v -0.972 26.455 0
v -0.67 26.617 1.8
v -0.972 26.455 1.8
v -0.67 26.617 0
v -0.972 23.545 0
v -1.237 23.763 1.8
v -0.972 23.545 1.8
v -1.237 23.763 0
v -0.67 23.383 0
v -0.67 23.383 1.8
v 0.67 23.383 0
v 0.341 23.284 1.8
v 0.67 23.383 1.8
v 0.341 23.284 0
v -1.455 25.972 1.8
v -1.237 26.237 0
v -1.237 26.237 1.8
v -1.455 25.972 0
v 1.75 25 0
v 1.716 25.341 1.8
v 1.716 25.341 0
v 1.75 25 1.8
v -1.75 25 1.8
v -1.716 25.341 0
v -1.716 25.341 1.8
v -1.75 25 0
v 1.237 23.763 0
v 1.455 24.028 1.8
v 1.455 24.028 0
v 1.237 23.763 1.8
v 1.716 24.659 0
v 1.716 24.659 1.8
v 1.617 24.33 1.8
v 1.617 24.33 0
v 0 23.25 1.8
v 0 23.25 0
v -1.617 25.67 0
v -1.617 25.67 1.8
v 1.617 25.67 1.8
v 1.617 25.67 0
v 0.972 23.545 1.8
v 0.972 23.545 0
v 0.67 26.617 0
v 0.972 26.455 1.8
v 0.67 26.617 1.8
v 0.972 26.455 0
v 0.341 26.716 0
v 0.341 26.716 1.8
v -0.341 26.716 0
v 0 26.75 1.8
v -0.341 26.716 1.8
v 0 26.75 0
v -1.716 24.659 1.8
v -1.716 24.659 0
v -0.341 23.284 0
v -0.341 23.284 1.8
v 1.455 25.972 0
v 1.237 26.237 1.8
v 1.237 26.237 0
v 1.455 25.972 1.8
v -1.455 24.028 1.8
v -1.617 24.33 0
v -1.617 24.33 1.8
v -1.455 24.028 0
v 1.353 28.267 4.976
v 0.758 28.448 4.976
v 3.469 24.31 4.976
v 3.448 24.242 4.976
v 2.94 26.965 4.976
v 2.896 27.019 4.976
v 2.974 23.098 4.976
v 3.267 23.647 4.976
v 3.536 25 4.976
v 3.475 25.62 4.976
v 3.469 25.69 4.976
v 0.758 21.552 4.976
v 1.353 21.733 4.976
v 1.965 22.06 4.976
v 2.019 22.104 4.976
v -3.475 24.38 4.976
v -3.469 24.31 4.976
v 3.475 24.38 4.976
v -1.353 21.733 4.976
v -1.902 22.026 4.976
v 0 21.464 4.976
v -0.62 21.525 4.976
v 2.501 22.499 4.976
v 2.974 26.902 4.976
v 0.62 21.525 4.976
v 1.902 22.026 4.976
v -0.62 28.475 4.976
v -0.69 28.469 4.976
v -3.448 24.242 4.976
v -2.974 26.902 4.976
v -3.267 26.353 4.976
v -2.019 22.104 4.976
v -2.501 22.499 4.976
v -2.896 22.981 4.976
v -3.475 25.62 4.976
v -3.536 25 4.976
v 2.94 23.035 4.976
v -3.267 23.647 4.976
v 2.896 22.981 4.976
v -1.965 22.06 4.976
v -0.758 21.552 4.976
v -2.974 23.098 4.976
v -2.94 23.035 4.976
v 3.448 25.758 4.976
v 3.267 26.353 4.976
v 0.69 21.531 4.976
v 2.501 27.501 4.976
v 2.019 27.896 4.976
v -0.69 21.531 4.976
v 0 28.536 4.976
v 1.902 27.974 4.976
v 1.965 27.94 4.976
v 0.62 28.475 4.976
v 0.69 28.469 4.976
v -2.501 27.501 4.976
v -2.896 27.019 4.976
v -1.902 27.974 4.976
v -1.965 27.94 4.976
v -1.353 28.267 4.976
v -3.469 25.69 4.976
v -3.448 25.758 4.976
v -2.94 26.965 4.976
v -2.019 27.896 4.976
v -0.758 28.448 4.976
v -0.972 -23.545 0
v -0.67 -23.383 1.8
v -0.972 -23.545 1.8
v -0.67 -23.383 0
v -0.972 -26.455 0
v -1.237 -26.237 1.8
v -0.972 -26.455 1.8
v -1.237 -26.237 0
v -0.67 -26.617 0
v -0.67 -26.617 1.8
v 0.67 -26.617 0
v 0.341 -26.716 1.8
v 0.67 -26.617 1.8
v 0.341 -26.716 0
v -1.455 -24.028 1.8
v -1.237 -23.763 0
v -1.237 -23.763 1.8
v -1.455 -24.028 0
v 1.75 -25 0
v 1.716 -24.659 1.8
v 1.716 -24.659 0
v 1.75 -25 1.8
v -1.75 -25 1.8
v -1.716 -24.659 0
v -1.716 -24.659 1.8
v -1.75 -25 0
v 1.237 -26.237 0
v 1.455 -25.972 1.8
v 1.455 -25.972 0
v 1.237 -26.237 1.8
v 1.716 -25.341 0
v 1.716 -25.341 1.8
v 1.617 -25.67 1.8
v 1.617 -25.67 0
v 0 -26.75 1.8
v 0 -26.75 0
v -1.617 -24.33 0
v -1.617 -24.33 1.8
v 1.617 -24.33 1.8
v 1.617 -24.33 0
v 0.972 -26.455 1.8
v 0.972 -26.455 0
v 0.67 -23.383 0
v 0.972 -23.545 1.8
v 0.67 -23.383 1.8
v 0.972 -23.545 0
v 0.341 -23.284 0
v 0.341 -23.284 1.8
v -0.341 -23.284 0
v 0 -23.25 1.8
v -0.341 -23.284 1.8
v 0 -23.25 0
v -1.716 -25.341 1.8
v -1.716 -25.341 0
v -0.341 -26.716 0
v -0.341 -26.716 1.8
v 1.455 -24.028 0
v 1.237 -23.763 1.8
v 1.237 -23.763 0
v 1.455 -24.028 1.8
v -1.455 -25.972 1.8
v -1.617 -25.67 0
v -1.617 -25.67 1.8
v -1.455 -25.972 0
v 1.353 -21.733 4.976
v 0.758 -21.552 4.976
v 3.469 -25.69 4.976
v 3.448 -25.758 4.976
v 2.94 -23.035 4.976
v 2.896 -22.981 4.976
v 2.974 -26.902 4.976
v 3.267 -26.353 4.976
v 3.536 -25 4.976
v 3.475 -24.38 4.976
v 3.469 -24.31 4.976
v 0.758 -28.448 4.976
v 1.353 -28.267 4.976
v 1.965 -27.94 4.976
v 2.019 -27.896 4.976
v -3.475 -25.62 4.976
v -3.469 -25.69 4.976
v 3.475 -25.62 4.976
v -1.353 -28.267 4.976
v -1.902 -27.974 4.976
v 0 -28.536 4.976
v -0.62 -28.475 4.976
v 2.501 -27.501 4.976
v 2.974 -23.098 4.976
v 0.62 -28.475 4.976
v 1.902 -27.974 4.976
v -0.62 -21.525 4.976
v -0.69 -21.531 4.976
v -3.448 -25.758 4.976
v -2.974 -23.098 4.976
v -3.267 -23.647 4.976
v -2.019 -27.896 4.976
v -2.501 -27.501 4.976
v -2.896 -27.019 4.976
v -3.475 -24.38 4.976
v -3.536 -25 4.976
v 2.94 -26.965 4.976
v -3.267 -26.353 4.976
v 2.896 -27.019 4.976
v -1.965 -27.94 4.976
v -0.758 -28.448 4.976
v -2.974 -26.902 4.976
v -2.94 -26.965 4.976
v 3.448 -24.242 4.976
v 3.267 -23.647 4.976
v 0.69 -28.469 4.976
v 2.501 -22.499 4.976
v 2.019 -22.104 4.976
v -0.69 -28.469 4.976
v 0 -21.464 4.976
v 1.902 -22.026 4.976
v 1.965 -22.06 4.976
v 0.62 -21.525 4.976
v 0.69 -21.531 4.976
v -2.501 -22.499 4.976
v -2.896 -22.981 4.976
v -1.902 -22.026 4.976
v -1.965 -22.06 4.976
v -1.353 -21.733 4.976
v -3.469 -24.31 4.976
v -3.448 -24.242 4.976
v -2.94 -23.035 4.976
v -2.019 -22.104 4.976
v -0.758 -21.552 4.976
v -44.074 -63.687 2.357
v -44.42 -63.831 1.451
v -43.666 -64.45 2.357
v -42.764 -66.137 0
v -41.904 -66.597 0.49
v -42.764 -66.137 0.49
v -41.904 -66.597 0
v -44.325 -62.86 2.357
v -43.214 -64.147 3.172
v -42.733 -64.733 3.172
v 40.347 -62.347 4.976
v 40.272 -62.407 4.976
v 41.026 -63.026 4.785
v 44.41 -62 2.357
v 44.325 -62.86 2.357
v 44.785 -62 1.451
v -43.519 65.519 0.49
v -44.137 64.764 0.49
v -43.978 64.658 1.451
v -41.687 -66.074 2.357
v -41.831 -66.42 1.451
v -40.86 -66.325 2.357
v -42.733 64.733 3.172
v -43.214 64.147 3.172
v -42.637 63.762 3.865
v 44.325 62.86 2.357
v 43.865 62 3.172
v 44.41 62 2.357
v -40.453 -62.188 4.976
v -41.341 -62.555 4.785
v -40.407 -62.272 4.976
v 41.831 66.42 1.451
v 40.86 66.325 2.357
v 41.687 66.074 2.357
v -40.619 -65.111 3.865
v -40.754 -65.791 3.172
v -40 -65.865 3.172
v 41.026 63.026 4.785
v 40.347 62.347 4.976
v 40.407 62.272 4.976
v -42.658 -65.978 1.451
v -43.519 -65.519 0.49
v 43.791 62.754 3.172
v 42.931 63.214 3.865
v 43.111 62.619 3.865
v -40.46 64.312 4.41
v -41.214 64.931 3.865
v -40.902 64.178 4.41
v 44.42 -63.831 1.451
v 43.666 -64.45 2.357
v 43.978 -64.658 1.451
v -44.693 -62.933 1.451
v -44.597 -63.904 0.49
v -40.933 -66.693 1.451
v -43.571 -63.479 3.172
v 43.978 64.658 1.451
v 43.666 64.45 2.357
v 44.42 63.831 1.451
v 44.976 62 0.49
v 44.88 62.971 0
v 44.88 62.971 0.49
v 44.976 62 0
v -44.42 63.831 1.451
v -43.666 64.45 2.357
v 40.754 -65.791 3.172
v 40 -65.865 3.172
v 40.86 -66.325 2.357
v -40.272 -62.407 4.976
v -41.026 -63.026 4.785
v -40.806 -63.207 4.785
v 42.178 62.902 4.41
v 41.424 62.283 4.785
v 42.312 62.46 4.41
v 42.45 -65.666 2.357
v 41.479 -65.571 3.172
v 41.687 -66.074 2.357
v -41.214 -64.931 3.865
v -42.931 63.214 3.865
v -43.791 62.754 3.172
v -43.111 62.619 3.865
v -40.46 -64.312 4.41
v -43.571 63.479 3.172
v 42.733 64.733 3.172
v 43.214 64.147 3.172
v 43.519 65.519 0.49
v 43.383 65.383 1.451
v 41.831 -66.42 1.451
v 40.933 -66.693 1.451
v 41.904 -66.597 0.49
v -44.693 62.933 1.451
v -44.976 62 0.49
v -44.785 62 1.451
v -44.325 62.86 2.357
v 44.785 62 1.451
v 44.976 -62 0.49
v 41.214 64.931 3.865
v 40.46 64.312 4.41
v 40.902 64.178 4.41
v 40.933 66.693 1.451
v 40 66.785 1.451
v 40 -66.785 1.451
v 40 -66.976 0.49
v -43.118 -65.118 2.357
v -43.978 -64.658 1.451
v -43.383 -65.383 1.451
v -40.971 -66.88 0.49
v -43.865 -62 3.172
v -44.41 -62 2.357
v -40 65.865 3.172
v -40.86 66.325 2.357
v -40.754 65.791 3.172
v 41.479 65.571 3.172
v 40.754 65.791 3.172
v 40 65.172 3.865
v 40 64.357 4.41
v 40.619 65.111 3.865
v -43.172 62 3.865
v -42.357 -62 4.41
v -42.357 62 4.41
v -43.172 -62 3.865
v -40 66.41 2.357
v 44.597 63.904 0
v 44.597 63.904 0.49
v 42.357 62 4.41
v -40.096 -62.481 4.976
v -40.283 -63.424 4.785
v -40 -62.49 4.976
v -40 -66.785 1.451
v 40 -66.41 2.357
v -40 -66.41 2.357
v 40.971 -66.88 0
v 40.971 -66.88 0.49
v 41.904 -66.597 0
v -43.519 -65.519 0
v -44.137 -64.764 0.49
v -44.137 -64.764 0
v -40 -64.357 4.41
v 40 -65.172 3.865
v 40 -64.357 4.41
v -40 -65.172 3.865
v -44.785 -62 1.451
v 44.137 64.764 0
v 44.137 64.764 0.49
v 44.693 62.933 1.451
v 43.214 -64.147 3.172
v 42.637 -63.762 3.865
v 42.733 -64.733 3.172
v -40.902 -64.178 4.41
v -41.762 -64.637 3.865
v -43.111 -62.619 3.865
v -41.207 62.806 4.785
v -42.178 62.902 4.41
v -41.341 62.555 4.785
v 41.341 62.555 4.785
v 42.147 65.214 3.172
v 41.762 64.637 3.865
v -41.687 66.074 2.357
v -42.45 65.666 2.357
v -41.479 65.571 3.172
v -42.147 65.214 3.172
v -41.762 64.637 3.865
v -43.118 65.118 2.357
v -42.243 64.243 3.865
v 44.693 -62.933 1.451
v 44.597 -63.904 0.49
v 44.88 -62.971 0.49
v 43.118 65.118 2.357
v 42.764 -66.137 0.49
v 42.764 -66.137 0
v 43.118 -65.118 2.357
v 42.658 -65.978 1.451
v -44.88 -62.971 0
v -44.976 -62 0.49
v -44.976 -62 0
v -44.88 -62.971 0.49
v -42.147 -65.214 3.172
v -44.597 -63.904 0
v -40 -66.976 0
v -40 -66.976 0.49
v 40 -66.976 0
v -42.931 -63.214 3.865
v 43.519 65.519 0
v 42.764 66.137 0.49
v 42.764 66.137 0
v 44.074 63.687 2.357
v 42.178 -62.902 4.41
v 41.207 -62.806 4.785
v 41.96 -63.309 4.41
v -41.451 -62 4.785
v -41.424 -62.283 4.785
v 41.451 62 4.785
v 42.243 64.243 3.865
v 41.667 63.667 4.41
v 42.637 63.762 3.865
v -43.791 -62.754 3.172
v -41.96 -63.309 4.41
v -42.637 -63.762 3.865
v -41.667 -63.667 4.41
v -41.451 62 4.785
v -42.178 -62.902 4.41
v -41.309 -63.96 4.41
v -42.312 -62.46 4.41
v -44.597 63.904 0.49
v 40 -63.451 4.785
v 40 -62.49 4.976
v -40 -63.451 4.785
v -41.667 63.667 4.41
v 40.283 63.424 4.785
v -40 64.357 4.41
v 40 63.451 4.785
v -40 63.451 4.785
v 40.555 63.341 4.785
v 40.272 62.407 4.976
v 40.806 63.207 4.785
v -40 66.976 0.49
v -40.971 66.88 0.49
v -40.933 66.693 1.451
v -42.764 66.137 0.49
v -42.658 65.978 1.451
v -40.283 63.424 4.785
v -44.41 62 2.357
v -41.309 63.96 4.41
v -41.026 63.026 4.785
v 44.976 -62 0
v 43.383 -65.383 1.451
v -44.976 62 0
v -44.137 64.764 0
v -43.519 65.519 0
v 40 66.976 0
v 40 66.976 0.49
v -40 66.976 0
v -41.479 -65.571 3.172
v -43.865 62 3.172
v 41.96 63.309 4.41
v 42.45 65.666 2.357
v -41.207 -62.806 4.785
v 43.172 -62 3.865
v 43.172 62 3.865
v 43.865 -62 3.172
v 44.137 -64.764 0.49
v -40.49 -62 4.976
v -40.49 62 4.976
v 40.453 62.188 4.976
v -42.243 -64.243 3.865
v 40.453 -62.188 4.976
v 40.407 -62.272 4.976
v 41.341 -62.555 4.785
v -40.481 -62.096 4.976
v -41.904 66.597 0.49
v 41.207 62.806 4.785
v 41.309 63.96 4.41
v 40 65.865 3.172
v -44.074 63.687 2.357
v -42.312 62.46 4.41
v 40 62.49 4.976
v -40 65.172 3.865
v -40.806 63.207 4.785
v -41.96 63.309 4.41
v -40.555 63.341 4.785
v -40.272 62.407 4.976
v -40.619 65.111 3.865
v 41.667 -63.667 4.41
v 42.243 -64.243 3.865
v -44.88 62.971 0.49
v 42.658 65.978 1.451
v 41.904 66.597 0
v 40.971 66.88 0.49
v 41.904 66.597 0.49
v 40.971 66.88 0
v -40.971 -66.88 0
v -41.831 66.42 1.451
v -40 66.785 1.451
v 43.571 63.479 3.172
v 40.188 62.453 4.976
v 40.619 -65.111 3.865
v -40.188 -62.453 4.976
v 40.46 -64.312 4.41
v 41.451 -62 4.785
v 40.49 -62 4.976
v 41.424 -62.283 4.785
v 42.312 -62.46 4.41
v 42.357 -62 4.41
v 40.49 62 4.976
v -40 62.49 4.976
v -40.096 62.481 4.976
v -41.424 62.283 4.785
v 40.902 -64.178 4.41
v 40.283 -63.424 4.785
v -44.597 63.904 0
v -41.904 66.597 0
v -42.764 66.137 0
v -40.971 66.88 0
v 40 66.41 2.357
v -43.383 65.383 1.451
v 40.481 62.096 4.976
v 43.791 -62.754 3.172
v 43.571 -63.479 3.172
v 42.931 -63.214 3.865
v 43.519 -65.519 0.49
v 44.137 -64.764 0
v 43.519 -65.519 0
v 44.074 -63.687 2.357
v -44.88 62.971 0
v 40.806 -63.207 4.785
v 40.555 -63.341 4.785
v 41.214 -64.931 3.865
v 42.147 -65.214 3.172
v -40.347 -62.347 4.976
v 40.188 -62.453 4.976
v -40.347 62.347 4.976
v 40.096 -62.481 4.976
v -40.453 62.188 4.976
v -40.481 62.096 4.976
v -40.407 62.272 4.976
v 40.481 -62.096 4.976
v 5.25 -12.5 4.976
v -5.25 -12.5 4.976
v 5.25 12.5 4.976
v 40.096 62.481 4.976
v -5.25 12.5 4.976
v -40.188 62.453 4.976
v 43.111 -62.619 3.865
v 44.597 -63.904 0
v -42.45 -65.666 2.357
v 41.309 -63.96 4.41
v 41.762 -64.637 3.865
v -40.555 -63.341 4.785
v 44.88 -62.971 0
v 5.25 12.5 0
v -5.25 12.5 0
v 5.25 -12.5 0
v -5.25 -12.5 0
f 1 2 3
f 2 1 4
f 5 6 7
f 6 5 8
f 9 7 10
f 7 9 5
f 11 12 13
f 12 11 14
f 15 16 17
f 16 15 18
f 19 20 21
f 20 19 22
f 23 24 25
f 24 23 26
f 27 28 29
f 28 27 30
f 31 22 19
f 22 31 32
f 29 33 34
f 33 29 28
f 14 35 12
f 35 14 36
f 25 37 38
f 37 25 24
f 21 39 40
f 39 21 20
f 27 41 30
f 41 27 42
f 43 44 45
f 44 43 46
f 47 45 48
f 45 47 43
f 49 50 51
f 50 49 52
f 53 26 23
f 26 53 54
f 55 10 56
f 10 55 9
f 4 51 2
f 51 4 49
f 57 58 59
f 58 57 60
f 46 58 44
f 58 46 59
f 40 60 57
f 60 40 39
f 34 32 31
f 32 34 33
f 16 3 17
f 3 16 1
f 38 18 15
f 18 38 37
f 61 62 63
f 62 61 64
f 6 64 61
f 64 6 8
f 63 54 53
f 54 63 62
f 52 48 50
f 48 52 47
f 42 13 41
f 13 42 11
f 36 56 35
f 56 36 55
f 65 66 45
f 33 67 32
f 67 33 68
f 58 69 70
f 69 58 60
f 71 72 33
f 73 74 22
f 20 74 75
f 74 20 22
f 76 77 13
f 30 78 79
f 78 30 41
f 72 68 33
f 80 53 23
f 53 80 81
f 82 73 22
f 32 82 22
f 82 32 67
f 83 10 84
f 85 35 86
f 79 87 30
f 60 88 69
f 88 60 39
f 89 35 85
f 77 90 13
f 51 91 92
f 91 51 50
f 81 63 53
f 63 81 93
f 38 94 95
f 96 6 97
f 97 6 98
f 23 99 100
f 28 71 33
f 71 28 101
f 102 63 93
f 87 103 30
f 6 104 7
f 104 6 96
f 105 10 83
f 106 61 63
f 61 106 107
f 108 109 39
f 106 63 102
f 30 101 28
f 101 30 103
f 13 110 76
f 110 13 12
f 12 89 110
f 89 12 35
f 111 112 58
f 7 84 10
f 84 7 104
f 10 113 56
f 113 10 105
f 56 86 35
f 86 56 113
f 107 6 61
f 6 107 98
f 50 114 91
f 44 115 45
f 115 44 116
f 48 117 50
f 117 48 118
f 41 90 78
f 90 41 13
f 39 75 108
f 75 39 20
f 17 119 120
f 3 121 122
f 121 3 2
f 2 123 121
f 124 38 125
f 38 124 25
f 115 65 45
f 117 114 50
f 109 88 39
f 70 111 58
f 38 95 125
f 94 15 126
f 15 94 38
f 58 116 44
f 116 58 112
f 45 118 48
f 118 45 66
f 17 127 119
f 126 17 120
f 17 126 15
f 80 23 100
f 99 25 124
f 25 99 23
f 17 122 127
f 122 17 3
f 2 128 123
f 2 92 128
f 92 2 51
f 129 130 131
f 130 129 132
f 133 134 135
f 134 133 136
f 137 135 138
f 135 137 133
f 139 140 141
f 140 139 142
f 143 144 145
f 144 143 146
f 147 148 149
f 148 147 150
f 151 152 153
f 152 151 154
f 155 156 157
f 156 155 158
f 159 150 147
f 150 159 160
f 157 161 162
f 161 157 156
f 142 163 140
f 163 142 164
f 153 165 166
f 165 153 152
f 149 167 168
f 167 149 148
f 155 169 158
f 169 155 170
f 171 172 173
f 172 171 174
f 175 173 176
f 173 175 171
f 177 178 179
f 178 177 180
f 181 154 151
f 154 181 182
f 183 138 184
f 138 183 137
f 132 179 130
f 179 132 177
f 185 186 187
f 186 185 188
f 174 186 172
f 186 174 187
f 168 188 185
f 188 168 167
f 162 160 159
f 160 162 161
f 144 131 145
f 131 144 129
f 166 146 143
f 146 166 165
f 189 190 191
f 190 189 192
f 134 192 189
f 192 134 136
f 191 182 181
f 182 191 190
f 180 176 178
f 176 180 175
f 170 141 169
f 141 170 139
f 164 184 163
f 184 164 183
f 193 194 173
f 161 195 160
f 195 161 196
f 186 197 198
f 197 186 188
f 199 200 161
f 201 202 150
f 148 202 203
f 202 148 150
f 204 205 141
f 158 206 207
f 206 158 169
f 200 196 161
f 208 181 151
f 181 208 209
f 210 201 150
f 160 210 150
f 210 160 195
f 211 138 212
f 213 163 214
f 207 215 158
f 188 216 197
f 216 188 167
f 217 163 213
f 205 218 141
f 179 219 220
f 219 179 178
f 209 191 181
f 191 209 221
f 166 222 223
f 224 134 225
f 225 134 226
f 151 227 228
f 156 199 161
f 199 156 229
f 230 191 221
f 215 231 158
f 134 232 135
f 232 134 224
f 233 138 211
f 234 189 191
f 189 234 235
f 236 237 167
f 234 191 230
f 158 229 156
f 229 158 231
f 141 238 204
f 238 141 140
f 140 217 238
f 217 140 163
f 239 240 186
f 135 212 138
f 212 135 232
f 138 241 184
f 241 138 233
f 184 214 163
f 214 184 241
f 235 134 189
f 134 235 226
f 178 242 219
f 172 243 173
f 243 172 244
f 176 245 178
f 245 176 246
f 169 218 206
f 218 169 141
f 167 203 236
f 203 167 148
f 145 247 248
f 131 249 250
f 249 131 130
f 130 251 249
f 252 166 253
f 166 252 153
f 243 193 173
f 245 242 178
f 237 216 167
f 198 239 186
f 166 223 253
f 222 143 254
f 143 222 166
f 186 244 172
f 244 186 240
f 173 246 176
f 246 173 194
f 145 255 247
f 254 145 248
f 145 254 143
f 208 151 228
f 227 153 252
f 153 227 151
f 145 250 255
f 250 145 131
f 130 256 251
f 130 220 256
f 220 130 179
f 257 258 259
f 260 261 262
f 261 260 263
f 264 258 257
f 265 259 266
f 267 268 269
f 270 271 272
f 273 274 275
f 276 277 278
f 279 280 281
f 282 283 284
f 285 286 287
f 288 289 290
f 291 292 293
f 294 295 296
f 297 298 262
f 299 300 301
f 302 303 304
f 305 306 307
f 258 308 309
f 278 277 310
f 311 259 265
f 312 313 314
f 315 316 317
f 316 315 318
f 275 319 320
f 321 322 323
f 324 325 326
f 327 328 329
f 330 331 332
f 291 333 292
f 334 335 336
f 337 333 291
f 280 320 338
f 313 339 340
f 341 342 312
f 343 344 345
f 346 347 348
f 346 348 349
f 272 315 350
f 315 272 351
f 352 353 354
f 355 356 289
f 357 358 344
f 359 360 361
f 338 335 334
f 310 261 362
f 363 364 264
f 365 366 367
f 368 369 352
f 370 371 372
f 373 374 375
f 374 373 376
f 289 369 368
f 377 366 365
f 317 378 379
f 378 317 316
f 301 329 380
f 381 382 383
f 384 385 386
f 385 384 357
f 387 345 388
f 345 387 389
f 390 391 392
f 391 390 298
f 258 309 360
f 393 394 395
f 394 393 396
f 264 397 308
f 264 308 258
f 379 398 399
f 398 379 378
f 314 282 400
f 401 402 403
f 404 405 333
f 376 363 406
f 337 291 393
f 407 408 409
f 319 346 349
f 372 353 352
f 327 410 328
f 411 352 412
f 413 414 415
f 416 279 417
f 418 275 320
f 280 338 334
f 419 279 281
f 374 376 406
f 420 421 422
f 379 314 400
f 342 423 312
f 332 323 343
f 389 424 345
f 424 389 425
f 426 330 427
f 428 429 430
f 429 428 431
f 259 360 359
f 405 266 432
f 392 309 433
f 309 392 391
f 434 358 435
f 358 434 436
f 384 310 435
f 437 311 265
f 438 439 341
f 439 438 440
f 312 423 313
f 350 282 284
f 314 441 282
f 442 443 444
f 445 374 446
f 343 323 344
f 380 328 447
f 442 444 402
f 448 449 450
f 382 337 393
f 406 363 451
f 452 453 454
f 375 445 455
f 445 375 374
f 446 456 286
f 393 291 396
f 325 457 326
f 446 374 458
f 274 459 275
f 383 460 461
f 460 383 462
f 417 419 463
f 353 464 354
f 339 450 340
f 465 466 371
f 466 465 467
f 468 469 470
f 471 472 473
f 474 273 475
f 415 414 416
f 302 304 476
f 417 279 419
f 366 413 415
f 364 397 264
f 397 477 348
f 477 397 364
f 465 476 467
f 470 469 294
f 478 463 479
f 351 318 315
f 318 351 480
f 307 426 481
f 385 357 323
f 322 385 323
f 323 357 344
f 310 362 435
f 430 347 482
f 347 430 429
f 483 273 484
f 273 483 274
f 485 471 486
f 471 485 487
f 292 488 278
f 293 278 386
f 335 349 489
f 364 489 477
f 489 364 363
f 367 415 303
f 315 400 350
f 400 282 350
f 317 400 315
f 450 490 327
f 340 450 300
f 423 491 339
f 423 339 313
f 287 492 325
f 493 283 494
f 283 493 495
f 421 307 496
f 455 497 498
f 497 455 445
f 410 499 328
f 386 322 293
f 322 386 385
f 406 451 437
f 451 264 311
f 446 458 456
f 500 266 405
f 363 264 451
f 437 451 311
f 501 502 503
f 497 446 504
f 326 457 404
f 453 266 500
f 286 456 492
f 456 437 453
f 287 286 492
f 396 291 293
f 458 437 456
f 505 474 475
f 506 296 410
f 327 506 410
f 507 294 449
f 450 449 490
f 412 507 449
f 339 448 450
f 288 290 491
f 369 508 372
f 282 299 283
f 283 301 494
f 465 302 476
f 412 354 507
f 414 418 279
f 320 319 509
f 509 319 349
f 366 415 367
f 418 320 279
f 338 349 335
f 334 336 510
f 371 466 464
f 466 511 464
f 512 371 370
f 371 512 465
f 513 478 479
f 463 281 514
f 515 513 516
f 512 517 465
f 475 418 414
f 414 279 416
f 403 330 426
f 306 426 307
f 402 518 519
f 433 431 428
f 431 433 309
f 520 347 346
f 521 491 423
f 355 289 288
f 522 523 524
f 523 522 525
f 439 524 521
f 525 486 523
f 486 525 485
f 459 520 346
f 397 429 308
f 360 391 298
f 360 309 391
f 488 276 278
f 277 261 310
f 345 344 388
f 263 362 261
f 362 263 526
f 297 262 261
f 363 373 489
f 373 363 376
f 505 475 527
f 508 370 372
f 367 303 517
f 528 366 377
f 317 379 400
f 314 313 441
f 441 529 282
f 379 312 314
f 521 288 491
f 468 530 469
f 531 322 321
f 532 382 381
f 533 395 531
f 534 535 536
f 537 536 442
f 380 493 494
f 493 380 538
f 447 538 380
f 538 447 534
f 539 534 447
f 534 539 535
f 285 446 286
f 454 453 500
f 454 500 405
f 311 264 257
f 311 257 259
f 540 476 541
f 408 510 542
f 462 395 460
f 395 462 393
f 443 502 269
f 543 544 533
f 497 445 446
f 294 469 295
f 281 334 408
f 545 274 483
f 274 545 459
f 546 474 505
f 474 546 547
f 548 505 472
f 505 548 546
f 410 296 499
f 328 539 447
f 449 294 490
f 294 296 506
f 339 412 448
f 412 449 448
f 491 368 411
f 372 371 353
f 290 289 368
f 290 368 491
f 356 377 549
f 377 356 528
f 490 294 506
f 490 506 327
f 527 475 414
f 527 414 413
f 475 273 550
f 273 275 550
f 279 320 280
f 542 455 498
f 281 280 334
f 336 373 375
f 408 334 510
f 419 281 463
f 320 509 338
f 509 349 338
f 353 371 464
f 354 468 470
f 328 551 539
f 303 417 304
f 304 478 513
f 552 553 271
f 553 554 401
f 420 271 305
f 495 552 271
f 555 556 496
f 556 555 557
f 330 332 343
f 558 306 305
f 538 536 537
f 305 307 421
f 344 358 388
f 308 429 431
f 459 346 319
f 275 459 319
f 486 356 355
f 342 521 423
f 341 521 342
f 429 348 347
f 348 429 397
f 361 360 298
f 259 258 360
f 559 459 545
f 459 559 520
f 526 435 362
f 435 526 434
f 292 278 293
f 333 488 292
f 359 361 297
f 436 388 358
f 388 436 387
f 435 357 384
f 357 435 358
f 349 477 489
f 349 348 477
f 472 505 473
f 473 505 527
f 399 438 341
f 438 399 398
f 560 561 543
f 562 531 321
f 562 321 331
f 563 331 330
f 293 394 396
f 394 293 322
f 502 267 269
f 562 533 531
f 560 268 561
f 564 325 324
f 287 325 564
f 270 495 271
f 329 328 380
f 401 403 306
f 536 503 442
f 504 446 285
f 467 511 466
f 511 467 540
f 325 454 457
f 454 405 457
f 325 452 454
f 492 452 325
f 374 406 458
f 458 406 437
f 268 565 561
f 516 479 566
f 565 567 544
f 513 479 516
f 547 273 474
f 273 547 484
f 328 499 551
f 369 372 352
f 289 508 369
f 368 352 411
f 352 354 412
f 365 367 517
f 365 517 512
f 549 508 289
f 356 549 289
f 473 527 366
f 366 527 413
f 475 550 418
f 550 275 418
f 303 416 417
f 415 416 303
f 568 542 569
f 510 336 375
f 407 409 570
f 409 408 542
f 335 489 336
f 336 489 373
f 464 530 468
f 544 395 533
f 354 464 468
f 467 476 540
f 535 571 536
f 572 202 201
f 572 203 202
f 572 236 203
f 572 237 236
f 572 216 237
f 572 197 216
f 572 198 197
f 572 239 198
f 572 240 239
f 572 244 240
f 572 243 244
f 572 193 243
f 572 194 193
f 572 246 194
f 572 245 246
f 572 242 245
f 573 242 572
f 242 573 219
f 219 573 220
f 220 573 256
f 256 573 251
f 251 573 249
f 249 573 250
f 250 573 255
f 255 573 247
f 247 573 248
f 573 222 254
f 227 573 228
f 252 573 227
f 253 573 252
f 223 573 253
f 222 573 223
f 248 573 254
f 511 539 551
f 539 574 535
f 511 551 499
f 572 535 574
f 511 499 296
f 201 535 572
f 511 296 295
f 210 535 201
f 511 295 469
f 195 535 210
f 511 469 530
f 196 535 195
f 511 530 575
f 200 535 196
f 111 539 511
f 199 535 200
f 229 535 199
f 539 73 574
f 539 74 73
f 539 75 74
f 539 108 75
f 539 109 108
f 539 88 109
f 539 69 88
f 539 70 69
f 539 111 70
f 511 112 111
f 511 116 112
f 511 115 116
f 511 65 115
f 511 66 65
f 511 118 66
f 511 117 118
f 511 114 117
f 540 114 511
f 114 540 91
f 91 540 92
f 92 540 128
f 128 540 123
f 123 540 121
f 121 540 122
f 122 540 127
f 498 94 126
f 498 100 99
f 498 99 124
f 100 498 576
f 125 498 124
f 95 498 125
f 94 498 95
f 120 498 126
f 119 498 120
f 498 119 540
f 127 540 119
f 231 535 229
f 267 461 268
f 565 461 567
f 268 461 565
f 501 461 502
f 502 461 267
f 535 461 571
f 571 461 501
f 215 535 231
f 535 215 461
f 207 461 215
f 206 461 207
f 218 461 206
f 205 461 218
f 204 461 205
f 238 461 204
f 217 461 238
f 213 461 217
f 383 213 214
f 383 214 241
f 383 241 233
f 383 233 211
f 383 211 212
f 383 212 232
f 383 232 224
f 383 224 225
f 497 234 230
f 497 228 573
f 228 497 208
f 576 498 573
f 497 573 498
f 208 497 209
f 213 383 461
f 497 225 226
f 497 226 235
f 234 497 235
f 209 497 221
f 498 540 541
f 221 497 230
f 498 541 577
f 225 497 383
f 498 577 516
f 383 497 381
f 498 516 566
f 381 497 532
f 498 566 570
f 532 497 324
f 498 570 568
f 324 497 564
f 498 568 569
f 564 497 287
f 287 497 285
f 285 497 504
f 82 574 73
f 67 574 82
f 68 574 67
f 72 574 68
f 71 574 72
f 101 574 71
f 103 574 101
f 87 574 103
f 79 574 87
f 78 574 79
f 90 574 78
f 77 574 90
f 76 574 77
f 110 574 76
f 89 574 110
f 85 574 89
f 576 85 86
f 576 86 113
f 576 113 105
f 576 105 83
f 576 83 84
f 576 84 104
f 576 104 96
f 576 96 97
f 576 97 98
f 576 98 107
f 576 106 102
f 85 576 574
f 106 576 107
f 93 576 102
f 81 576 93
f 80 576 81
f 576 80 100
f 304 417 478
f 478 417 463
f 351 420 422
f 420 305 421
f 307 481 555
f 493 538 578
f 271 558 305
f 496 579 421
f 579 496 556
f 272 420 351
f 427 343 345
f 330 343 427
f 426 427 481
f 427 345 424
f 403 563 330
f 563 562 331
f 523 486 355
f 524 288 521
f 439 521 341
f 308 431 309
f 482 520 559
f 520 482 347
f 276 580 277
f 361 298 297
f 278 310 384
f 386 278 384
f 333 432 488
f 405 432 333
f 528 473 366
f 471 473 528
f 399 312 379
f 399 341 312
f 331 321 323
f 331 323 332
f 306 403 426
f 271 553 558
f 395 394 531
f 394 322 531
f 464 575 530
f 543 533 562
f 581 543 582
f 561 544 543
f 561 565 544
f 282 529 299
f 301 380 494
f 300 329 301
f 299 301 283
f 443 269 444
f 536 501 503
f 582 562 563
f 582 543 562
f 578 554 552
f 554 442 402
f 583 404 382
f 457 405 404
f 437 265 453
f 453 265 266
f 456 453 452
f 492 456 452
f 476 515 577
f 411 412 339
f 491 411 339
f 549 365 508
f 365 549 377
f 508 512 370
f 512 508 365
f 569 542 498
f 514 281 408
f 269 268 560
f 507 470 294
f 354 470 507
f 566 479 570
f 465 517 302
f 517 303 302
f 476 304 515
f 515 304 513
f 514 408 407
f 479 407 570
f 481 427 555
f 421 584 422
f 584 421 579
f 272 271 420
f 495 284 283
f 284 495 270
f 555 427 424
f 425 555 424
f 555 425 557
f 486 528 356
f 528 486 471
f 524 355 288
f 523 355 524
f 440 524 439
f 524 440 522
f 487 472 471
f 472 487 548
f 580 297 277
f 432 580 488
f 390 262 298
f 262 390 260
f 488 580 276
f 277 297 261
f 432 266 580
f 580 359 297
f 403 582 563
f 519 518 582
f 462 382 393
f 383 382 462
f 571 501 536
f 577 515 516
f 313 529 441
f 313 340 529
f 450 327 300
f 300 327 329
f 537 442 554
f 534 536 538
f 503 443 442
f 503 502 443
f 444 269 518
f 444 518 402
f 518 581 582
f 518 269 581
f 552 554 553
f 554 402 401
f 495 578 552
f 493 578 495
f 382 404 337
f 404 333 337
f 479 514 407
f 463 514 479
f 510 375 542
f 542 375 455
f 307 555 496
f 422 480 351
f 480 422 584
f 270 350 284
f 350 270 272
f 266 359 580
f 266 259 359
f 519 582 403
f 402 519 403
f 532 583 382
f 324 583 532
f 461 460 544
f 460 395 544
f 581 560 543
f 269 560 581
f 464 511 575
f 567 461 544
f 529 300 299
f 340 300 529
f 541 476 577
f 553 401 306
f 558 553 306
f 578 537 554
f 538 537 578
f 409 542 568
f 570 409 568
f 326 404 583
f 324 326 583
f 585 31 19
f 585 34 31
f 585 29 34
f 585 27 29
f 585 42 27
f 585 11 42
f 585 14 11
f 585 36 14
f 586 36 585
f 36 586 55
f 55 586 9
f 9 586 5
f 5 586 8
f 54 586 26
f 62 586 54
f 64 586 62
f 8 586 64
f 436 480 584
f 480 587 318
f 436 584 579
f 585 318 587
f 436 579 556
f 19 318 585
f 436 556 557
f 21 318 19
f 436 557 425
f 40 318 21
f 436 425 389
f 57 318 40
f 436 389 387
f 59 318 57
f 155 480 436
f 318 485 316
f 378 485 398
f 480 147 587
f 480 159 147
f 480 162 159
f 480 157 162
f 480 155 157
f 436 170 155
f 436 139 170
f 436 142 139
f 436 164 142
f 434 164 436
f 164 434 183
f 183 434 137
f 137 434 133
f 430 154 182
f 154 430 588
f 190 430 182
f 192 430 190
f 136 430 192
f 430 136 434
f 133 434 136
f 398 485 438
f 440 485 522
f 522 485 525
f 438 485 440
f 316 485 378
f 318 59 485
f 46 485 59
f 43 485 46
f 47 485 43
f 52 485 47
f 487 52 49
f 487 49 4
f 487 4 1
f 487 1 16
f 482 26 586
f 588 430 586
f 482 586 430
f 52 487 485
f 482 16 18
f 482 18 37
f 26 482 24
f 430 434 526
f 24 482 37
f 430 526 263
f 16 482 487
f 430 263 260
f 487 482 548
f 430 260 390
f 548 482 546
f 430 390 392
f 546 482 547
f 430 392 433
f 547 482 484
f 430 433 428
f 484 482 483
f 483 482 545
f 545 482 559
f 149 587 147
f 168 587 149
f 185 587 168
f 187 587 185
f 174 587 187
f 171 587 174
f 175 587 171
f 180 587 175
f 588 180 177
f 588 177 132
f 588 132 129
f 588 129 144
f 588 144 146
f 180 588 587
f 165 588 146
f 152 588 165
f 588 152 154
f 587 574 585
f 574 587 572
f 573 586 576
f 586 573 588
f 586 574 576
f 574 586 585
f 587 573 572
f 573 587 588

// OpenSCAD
//Toon Light Switch Plate by thistof 2017
//made customizable by cpwallen
//this version is for a rectangular switch cover (original was trapezoidal)


//----variable definitions----

//height of switch cover (long axis)
height= 134;

//width of cover
width= 90;

//thickness of cover 
thickness= 5; //[3,0.5,7]

//smoothness of curves
$fn=32;

//height of switch 
Hswitch= 24.5; //[20,0.5,30]

//width of switch
Wswitch= 10; //[8,0.2,12]

//screw distance from center of switch hole
screwDist=25; //[25,1,35]

//screw head diameter
DscrewHead=8;

//diameter of threaded part of screw
Dscrew=3.5;

//length of threaded part of screw
Lscrew=4;

//screw head height
headHeight=3.6; //[3,0.2,5]

//wiggle room (tolerance for switch hole)
w=0.25; 

// ----calculations----

//radius of curvature of corners
rcorner=thickness;

//----assembly of design----

difference(){
hull(){
        translate([width/2-rcorner,height/2-rcorner]) sphere(rcorner,center=true);
        translate([width/2-rcorner,-(height/2-rcorner)]) sphere(rcorner,center=true);
        translate([-(width/2-rcorner),height/2-rcorner]) sphere(rcorner,center=true);
        translate([-(width/2-rcorner),-(height/2-rcorner)]) sphere(rcorner,center=true);
    }
    
translate([0,0,-thickness]) cube([width,height,2*thickness],center=true);
    cube([(Wswitch)+2*w,(Hswitch)+2*w,(thickness*2)+2*w],center=true);
    translate([0,screwDist,0]) screw();
    translate([0,-screwDist,0]) screw();
}
module screw(){
    translate([0,0,0]) cylinder(d=Dscrew,h=Lscrew,center=true);
    translate([0,0,headHeight/2]) cylinder(d1=Dscrew,d2=DscrewHead,h=Lscrew);
}    
